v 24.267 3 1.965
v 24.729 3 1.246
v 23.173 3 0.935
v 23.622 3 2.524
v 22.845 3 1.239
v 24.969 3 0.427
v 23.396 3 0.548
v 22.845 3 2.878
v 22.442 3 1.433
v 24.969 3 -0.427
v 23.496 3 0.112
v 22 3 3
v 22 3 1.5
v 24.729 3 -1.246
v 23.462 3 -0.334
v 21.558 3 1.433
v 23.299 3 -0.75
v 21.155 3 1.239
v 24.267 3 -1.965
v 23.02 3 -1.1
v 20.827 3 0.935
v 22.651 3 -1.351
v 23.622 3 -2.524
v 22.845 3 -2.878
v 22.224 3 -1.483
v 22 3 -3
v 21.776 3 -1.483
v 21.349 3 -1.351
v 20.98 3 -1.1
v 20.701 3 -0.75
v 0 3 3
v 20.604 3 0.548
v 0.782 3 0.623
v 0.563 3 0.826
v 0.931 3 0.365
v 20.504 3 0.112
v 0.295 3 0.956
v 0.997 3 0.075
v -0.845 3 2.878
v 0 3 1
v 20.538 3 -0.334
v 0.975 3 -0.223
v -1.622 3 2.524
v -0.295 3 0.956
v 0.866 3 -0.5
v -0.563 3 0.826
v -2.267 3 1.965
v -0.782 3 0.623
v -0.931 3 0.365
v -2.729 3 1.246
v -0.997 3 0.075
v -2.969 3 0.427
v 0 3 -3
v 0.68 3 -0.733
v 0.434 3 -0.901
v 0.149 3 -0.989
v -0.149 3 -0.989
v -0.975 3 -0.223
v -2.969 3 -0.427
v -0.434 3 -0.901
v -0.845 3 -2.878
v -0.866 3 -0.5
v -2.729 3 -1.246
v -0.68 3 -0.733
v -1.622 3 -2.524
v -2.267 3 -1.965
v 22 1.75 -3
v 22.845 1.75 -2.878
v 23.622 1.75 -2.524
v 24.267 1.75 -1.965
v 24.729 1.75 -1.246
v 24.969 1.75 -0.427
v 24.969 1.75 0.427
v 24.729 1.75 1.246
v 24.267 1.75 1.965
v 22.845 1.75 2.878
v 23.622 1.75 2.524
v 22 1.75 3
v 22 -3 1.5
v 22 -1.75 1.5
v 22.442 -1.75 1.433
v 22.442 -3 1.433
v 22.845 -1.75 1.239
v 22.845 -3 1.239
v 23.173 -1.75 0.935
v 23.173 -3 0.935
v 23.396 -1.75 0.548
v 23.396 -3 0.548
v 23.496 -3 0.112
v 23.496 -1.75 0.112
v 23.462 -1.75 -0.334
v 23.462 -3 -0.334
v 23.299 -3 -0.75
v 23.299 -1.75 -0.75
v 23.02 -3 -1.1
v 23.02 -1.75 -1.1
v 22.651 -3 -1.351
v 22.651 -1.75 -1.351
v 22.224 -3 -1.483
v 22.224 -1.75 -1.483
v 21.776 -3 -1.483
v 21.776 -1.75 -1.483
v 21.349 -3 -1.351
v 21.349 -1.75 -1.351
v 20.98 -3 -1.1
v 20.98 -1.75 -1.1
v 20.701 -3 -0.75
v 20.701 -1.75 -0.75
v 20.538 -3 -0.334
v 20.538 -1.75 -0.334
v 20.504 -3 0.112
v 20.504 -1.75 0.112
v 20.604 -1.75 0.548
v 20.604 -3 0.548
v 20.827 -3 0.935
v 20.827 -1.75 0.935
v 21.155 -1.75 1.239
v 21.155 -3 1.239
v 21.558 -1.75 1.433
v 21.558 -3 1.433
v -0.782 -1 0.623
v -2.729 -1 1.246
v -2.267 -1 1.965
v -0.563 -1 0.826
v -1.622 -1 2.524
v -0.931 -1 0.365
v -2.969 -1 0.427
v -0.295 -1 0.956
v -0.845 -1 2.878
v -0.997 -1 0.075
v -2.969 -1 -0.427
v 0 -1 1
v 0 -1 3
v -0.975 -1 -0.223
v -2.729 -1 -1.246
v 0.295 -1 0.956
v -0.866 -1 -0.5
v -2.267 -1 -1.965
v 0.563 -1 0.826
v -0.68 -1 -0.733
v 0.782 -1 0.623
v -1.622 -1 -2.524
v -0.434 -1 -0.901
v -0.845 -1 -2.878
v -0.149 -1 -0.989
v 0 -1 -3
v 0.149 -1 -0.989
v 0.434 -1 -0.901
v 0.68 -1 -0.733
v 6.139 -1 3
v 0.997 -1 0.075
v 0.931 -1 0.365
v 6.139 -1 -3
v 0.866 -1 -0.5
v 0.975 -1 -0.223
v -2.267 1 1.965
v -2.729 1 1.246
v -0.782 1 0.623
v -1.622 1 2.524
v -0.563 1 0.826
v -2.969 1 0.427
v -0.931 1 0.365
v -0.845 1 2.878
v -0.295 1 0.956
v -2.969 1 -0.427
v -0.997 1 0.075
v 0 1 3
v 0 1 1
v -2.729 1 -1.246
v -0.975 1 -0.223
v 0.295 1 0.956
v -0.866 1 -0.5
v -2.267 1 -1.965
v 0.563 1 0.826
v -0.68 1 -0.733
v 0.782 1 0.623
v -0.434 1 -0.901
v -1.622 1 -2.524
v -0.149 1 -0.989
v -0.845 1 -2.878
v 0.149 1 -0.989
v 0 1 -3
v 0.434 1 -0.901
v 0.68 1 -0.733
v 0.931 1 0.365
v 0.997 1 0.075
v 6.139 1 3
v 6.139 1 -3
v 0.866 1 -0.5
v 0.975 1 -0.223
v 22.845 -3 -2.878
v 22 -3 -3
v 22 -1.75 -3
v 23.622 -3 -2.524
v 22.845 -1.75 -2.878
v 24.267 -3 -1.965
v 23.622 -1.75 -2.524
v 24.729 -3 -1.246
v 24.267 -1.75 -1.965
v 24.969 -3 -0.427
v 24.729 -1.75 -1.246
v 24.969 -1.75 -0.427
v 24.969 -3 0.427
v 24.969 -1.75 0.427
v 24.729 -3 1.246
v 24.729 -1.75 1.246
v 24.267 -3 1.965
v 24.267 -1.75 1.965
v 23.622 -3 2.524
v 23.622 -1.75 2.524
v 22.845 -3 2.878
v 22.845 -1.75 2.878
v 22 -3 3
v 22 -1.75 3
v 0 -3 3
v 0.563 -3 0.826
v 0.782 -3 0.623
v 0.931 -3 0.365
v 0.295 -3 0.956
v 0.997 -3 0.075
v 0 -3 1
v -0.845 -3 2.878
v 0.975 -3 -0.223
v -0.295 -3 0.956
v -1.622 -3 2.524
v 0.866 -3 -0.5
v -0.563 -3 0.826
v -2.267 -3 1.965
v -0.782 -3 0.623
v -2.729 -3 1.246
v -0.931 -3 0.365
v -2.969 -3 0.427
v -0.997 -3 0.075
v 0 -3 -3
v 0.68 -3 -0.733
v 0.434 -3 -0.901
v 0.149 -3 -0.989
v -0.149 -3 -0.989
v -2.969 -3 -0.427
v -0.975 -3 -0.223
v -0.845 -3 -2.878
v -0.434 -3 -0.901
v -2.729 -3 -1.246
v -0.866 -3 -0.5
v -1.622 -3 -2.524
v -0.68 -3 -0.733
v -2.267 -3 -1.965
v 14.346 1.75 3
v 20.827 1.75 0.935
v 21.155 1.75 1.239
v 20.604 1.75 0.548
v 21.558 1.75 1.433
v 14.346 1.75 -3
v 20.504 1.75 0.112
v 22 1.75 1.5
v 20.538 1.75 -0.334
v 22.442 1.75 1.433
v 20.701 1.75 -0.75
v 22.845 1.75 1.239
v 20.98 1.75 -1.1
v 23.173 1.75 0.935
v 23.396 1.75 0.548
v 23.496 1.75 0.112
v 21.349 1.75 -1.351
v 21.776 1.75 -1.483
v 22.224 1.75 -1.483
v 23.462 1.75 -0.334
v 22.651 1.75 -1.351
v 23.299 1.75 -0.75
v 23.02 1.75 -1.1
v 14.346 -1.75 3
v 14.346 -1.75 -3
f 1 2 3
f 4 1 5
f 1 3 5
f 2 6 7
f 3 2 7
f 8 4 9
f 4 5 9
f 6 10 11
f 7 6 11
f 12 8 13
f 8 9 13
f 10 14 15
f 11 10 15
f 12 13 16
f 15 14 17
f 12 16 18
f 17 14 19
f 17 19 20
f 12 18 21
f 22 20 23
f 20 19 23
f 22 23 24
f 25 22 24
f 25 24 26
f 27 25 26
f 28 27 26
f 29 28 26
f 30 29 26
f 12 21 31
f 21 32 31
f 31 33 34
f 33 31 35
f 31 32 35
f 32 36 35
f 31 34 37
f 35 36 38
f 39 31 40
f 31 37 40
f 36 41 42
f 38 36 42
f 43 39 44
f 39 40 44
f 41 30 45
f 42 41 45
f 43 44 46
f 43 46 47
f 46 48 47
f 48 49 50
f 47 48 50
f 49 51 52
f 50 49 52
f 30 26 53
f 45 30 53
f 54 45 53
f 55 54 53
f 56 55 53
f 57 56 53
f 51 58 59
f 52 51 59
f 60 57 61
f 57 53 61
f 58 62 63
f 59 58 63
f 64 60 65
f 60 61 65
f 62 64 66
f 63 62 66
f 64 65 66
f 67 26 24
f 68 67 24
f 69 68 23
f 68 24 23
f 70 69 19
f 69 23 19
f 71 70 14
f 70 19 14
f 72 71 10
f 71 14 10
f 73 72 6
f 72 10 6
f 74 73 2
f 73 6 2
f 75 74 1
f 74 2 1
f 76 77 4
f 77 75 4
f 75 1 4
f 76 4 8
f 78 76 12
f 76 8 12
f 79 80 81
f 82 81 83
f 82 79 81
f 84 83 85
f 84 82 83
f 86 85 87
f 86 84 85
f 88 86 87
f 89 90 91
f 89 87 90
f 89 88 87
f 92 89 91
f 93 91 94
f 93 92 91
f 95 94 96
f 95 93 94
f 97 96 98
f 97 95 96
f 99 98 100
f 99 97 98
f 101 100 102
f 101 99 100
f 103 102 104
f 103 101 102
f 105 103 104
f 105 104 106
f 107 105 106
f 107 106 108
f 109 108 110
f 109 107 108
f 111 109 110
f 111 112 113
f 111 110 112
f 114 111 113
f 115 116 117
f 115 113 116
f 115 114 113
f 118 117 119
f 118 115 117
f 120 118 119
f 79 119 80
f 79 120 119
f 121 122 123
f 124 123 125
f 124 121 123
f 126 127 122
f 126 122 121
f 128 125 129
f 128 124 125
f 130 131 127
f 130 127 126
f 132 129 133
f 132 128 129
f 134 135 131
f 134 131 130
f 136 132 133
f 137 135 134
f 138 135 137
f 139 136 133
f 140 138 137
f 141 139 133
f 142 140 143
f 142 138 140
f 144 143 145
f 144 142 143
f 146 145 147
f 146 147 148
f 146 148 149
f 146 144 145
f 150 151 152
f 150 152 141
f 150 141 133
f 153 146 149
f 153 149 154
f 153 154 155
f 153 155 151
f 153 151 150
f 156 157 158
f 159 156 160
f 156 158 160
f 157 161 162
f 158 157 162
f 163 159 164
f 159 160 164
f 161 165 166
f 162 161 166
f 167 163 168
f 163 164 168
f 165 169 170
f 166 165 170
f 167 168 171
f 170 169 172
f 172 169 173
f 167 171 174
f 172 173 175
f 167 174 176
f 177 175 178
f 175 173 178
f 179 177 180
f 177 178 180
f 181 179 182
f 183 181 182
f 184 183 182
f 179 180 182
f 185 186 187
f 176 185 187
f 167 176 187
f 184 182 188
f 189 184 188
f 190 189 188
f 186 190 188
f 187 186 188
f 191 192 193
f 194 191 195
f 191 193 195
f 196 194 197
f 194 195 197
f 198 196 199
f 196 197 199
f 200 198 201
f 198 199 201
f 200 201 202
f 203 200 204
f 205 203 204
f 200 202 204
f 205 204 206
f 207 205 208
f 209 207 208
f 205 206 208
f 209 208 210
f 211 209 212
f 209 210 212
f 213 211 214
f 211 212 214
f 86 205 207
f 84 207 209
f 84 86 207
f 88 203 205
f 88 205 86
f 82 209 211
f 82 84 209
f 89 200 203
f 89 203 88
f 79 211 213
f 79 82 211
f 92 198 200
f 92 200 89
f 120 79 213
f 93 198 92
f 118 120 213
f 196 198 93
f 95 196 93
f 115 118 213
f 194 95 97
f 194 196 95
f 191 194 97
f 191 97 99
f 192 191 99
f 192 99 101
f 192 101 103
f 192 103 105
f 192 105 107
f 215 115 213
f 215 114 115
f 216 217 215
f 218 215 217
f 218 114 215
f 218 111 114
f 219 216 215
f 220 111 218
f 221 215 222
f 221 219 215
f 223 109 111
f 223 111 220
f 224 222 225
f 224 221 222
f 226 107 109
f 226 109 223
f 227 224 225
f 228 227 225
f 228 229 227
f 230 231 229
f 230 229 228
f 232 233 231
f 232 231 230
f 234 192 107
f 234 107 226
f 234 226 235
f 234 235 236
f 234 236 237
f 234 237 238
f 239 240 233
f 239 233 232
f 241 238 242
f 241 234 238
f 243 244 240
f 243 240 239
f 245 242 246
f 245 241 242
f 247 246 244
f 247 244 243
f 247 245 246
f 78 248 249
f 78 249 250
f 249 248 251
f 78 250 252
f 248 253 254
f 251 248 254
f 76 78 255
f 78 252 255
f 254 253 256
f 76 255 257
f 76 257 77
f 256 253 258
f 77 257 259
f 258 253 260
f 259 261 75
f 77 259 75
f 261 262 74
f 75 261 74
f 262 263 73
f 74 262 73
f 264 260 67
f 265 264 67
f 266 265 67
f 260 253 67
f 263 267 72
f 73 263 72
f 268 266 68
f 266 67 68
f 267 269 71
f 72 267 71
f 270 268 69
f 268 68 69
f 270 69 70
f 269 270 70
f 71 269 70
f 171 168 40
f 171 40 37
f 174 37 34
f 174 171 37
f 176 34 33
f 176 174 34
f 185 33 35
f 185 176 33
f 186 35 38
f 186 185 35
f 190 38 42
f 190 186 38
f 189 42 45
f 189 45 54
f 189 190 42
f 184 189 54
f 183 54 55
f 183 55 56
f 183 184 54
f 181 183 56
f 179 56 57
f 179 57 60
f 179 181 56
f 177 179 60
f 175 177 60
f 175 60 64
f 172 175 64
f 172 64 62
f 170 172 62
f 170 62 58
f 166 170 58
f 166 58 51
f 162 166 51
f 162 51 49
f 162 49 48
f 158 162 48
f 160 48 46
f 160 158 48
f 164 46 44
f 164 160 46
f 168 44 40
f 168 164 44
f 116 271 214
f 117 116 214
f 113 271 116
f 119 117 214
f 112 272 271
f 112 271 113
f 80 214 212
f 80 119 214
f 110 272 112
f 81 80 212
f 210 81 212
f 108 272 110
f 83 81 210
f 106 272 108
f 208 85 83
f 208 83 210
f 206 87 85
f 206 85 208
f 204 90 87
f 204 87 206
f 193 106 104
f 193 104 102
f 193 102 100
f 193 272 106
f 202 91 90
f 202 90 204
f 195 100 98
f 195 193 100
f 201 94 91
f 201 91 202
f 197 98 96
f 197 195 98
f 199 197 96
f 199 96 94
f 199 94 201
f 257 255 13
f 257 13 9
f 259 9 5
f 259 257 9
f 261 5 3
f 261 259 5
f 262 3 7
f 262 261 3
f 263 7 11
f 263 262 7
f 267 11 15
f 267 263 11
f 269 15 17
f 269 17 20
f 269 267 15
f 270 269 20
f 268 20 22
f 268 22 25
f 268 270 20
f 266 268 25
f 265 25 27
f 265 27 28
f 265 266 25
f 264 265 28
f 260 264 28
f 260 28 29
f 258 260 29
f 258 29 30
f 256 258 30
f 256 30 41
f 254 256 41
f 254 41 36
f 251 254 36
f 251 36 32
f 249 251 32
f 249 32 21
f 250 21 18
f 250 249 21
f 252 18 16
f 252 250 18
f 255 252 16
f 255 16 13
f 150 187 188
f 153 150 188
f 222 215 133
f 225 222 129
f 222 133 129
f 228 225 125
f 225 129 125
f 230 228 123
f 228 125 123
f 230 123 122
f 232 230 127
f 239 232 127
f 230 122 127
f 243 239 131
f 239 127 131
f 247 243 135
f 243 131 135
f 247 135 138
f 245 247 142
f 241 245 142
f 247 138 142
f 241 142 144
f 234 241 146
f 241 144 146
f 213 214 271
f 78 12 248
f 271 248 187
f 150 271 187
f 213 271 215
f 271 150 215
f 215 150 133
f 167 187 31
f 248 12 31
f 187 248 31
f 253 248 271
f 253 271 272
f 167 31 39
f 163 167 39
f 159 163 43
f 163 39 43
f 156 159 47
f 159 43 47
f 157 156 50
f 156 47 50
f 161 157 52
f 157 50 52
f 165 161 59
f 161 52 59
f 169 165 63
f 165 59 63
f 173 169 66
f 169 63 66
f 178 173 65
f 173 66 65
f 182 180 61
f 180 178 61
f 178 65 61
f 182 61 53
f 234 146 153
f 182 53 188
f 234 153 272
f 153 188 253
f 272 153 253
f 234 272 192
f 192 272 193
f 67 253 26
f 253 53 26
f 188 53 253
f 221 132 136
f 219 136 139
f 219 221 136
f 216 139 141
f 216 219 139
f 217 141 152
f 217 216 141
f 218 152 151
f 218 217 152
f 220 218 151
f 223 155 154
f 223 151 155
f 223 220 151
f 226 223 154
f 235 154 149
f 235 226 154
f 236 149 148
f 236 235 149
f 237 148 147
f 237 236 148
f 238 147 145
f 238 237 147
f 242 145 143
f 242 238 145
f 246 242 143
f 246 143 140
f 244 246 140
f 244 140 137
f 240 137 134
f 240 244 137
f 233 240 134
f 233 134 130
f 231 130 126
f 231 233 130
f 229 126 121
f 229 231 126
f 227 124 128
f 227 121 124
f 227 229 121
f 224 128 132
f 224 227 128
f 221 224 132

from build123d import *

# Parameters (mm, degrees)
SKETCH_1_R          = 1.5
SKETCH_1_R_2        = 1
EXTRUDE_1_DEPTH     = 3
SKETCH_6_W          = 31.511370345
SKETCH_6_H          = 11.605197544
CUT_EXTRUDE_2_DEPTH = 1.75
SKETCH_7_W          = 12.660216836
SKETCH_7_H          = 9.649927943
CUT_EXTRUDE_3_DEPTH = 1


with BuildPart() as part:
    # 草图1 → 凸台-拉伸1 (new, symmetric)
    with BuildSketch(Plane(origin=(0, 0, 0), x_dir=(1, 0, 0), z_dir=(0, 1, 0))):
        with BuildLine():
            Line((0, 3), (22, 3))
            ThreePointArc((22, 3), (25, 0), (22, -3))
            Line((22, -3), (0, -3))
            ThreePointArc((0, -3), (-3, 0), (0, 3))
        make_face()
        with Locations(Location((22, 0, 0), (0, 0, 270))):
            Circle(SKETCH_1_R, mode=Mode.SUBTRACT)
        with Locations(Location((0, 0, 0), (0, 0, 270))):
            Circle(SKETCH_1_R_2, mode=Mode.SUBTRACT)
    extrude(amount=EXTRUDE_1_DEPTH, both=True)

    # 草图6 → 切除-拉伸2 (cut, symmetric)
    with BuildSketch(Plane(origin=(0, 0, 0), x_dir=(1, 0, 0), z_dir=(0, 1, 0))):
        with Locations((30.101826092, 2.040608699)):
            Rectangle(SKETCH_6_W, SKETCH_6_H)
    extrude(amount=CUT_EXTRUDE_2_DEPTH, both=True, mode=Mode.SUBTRACT)

    # 草图7 → 切除-拉伸3 (cut, symmetric)
    with BuildSketch(Plane(origin=(0, 0, 0), x_dir=(1, 0, 0), z_dir=(0, 1, 0))):
        with Locations((-0.191074288, 0.210879474)):
            Rectangle(SKETCH_7_W, SKETCH_7_H)
    extrude(amount=CUT_EXTRUDE_3_DEPTH, both=True, mode=Mode.SUBTRACT)


solid = part.part
